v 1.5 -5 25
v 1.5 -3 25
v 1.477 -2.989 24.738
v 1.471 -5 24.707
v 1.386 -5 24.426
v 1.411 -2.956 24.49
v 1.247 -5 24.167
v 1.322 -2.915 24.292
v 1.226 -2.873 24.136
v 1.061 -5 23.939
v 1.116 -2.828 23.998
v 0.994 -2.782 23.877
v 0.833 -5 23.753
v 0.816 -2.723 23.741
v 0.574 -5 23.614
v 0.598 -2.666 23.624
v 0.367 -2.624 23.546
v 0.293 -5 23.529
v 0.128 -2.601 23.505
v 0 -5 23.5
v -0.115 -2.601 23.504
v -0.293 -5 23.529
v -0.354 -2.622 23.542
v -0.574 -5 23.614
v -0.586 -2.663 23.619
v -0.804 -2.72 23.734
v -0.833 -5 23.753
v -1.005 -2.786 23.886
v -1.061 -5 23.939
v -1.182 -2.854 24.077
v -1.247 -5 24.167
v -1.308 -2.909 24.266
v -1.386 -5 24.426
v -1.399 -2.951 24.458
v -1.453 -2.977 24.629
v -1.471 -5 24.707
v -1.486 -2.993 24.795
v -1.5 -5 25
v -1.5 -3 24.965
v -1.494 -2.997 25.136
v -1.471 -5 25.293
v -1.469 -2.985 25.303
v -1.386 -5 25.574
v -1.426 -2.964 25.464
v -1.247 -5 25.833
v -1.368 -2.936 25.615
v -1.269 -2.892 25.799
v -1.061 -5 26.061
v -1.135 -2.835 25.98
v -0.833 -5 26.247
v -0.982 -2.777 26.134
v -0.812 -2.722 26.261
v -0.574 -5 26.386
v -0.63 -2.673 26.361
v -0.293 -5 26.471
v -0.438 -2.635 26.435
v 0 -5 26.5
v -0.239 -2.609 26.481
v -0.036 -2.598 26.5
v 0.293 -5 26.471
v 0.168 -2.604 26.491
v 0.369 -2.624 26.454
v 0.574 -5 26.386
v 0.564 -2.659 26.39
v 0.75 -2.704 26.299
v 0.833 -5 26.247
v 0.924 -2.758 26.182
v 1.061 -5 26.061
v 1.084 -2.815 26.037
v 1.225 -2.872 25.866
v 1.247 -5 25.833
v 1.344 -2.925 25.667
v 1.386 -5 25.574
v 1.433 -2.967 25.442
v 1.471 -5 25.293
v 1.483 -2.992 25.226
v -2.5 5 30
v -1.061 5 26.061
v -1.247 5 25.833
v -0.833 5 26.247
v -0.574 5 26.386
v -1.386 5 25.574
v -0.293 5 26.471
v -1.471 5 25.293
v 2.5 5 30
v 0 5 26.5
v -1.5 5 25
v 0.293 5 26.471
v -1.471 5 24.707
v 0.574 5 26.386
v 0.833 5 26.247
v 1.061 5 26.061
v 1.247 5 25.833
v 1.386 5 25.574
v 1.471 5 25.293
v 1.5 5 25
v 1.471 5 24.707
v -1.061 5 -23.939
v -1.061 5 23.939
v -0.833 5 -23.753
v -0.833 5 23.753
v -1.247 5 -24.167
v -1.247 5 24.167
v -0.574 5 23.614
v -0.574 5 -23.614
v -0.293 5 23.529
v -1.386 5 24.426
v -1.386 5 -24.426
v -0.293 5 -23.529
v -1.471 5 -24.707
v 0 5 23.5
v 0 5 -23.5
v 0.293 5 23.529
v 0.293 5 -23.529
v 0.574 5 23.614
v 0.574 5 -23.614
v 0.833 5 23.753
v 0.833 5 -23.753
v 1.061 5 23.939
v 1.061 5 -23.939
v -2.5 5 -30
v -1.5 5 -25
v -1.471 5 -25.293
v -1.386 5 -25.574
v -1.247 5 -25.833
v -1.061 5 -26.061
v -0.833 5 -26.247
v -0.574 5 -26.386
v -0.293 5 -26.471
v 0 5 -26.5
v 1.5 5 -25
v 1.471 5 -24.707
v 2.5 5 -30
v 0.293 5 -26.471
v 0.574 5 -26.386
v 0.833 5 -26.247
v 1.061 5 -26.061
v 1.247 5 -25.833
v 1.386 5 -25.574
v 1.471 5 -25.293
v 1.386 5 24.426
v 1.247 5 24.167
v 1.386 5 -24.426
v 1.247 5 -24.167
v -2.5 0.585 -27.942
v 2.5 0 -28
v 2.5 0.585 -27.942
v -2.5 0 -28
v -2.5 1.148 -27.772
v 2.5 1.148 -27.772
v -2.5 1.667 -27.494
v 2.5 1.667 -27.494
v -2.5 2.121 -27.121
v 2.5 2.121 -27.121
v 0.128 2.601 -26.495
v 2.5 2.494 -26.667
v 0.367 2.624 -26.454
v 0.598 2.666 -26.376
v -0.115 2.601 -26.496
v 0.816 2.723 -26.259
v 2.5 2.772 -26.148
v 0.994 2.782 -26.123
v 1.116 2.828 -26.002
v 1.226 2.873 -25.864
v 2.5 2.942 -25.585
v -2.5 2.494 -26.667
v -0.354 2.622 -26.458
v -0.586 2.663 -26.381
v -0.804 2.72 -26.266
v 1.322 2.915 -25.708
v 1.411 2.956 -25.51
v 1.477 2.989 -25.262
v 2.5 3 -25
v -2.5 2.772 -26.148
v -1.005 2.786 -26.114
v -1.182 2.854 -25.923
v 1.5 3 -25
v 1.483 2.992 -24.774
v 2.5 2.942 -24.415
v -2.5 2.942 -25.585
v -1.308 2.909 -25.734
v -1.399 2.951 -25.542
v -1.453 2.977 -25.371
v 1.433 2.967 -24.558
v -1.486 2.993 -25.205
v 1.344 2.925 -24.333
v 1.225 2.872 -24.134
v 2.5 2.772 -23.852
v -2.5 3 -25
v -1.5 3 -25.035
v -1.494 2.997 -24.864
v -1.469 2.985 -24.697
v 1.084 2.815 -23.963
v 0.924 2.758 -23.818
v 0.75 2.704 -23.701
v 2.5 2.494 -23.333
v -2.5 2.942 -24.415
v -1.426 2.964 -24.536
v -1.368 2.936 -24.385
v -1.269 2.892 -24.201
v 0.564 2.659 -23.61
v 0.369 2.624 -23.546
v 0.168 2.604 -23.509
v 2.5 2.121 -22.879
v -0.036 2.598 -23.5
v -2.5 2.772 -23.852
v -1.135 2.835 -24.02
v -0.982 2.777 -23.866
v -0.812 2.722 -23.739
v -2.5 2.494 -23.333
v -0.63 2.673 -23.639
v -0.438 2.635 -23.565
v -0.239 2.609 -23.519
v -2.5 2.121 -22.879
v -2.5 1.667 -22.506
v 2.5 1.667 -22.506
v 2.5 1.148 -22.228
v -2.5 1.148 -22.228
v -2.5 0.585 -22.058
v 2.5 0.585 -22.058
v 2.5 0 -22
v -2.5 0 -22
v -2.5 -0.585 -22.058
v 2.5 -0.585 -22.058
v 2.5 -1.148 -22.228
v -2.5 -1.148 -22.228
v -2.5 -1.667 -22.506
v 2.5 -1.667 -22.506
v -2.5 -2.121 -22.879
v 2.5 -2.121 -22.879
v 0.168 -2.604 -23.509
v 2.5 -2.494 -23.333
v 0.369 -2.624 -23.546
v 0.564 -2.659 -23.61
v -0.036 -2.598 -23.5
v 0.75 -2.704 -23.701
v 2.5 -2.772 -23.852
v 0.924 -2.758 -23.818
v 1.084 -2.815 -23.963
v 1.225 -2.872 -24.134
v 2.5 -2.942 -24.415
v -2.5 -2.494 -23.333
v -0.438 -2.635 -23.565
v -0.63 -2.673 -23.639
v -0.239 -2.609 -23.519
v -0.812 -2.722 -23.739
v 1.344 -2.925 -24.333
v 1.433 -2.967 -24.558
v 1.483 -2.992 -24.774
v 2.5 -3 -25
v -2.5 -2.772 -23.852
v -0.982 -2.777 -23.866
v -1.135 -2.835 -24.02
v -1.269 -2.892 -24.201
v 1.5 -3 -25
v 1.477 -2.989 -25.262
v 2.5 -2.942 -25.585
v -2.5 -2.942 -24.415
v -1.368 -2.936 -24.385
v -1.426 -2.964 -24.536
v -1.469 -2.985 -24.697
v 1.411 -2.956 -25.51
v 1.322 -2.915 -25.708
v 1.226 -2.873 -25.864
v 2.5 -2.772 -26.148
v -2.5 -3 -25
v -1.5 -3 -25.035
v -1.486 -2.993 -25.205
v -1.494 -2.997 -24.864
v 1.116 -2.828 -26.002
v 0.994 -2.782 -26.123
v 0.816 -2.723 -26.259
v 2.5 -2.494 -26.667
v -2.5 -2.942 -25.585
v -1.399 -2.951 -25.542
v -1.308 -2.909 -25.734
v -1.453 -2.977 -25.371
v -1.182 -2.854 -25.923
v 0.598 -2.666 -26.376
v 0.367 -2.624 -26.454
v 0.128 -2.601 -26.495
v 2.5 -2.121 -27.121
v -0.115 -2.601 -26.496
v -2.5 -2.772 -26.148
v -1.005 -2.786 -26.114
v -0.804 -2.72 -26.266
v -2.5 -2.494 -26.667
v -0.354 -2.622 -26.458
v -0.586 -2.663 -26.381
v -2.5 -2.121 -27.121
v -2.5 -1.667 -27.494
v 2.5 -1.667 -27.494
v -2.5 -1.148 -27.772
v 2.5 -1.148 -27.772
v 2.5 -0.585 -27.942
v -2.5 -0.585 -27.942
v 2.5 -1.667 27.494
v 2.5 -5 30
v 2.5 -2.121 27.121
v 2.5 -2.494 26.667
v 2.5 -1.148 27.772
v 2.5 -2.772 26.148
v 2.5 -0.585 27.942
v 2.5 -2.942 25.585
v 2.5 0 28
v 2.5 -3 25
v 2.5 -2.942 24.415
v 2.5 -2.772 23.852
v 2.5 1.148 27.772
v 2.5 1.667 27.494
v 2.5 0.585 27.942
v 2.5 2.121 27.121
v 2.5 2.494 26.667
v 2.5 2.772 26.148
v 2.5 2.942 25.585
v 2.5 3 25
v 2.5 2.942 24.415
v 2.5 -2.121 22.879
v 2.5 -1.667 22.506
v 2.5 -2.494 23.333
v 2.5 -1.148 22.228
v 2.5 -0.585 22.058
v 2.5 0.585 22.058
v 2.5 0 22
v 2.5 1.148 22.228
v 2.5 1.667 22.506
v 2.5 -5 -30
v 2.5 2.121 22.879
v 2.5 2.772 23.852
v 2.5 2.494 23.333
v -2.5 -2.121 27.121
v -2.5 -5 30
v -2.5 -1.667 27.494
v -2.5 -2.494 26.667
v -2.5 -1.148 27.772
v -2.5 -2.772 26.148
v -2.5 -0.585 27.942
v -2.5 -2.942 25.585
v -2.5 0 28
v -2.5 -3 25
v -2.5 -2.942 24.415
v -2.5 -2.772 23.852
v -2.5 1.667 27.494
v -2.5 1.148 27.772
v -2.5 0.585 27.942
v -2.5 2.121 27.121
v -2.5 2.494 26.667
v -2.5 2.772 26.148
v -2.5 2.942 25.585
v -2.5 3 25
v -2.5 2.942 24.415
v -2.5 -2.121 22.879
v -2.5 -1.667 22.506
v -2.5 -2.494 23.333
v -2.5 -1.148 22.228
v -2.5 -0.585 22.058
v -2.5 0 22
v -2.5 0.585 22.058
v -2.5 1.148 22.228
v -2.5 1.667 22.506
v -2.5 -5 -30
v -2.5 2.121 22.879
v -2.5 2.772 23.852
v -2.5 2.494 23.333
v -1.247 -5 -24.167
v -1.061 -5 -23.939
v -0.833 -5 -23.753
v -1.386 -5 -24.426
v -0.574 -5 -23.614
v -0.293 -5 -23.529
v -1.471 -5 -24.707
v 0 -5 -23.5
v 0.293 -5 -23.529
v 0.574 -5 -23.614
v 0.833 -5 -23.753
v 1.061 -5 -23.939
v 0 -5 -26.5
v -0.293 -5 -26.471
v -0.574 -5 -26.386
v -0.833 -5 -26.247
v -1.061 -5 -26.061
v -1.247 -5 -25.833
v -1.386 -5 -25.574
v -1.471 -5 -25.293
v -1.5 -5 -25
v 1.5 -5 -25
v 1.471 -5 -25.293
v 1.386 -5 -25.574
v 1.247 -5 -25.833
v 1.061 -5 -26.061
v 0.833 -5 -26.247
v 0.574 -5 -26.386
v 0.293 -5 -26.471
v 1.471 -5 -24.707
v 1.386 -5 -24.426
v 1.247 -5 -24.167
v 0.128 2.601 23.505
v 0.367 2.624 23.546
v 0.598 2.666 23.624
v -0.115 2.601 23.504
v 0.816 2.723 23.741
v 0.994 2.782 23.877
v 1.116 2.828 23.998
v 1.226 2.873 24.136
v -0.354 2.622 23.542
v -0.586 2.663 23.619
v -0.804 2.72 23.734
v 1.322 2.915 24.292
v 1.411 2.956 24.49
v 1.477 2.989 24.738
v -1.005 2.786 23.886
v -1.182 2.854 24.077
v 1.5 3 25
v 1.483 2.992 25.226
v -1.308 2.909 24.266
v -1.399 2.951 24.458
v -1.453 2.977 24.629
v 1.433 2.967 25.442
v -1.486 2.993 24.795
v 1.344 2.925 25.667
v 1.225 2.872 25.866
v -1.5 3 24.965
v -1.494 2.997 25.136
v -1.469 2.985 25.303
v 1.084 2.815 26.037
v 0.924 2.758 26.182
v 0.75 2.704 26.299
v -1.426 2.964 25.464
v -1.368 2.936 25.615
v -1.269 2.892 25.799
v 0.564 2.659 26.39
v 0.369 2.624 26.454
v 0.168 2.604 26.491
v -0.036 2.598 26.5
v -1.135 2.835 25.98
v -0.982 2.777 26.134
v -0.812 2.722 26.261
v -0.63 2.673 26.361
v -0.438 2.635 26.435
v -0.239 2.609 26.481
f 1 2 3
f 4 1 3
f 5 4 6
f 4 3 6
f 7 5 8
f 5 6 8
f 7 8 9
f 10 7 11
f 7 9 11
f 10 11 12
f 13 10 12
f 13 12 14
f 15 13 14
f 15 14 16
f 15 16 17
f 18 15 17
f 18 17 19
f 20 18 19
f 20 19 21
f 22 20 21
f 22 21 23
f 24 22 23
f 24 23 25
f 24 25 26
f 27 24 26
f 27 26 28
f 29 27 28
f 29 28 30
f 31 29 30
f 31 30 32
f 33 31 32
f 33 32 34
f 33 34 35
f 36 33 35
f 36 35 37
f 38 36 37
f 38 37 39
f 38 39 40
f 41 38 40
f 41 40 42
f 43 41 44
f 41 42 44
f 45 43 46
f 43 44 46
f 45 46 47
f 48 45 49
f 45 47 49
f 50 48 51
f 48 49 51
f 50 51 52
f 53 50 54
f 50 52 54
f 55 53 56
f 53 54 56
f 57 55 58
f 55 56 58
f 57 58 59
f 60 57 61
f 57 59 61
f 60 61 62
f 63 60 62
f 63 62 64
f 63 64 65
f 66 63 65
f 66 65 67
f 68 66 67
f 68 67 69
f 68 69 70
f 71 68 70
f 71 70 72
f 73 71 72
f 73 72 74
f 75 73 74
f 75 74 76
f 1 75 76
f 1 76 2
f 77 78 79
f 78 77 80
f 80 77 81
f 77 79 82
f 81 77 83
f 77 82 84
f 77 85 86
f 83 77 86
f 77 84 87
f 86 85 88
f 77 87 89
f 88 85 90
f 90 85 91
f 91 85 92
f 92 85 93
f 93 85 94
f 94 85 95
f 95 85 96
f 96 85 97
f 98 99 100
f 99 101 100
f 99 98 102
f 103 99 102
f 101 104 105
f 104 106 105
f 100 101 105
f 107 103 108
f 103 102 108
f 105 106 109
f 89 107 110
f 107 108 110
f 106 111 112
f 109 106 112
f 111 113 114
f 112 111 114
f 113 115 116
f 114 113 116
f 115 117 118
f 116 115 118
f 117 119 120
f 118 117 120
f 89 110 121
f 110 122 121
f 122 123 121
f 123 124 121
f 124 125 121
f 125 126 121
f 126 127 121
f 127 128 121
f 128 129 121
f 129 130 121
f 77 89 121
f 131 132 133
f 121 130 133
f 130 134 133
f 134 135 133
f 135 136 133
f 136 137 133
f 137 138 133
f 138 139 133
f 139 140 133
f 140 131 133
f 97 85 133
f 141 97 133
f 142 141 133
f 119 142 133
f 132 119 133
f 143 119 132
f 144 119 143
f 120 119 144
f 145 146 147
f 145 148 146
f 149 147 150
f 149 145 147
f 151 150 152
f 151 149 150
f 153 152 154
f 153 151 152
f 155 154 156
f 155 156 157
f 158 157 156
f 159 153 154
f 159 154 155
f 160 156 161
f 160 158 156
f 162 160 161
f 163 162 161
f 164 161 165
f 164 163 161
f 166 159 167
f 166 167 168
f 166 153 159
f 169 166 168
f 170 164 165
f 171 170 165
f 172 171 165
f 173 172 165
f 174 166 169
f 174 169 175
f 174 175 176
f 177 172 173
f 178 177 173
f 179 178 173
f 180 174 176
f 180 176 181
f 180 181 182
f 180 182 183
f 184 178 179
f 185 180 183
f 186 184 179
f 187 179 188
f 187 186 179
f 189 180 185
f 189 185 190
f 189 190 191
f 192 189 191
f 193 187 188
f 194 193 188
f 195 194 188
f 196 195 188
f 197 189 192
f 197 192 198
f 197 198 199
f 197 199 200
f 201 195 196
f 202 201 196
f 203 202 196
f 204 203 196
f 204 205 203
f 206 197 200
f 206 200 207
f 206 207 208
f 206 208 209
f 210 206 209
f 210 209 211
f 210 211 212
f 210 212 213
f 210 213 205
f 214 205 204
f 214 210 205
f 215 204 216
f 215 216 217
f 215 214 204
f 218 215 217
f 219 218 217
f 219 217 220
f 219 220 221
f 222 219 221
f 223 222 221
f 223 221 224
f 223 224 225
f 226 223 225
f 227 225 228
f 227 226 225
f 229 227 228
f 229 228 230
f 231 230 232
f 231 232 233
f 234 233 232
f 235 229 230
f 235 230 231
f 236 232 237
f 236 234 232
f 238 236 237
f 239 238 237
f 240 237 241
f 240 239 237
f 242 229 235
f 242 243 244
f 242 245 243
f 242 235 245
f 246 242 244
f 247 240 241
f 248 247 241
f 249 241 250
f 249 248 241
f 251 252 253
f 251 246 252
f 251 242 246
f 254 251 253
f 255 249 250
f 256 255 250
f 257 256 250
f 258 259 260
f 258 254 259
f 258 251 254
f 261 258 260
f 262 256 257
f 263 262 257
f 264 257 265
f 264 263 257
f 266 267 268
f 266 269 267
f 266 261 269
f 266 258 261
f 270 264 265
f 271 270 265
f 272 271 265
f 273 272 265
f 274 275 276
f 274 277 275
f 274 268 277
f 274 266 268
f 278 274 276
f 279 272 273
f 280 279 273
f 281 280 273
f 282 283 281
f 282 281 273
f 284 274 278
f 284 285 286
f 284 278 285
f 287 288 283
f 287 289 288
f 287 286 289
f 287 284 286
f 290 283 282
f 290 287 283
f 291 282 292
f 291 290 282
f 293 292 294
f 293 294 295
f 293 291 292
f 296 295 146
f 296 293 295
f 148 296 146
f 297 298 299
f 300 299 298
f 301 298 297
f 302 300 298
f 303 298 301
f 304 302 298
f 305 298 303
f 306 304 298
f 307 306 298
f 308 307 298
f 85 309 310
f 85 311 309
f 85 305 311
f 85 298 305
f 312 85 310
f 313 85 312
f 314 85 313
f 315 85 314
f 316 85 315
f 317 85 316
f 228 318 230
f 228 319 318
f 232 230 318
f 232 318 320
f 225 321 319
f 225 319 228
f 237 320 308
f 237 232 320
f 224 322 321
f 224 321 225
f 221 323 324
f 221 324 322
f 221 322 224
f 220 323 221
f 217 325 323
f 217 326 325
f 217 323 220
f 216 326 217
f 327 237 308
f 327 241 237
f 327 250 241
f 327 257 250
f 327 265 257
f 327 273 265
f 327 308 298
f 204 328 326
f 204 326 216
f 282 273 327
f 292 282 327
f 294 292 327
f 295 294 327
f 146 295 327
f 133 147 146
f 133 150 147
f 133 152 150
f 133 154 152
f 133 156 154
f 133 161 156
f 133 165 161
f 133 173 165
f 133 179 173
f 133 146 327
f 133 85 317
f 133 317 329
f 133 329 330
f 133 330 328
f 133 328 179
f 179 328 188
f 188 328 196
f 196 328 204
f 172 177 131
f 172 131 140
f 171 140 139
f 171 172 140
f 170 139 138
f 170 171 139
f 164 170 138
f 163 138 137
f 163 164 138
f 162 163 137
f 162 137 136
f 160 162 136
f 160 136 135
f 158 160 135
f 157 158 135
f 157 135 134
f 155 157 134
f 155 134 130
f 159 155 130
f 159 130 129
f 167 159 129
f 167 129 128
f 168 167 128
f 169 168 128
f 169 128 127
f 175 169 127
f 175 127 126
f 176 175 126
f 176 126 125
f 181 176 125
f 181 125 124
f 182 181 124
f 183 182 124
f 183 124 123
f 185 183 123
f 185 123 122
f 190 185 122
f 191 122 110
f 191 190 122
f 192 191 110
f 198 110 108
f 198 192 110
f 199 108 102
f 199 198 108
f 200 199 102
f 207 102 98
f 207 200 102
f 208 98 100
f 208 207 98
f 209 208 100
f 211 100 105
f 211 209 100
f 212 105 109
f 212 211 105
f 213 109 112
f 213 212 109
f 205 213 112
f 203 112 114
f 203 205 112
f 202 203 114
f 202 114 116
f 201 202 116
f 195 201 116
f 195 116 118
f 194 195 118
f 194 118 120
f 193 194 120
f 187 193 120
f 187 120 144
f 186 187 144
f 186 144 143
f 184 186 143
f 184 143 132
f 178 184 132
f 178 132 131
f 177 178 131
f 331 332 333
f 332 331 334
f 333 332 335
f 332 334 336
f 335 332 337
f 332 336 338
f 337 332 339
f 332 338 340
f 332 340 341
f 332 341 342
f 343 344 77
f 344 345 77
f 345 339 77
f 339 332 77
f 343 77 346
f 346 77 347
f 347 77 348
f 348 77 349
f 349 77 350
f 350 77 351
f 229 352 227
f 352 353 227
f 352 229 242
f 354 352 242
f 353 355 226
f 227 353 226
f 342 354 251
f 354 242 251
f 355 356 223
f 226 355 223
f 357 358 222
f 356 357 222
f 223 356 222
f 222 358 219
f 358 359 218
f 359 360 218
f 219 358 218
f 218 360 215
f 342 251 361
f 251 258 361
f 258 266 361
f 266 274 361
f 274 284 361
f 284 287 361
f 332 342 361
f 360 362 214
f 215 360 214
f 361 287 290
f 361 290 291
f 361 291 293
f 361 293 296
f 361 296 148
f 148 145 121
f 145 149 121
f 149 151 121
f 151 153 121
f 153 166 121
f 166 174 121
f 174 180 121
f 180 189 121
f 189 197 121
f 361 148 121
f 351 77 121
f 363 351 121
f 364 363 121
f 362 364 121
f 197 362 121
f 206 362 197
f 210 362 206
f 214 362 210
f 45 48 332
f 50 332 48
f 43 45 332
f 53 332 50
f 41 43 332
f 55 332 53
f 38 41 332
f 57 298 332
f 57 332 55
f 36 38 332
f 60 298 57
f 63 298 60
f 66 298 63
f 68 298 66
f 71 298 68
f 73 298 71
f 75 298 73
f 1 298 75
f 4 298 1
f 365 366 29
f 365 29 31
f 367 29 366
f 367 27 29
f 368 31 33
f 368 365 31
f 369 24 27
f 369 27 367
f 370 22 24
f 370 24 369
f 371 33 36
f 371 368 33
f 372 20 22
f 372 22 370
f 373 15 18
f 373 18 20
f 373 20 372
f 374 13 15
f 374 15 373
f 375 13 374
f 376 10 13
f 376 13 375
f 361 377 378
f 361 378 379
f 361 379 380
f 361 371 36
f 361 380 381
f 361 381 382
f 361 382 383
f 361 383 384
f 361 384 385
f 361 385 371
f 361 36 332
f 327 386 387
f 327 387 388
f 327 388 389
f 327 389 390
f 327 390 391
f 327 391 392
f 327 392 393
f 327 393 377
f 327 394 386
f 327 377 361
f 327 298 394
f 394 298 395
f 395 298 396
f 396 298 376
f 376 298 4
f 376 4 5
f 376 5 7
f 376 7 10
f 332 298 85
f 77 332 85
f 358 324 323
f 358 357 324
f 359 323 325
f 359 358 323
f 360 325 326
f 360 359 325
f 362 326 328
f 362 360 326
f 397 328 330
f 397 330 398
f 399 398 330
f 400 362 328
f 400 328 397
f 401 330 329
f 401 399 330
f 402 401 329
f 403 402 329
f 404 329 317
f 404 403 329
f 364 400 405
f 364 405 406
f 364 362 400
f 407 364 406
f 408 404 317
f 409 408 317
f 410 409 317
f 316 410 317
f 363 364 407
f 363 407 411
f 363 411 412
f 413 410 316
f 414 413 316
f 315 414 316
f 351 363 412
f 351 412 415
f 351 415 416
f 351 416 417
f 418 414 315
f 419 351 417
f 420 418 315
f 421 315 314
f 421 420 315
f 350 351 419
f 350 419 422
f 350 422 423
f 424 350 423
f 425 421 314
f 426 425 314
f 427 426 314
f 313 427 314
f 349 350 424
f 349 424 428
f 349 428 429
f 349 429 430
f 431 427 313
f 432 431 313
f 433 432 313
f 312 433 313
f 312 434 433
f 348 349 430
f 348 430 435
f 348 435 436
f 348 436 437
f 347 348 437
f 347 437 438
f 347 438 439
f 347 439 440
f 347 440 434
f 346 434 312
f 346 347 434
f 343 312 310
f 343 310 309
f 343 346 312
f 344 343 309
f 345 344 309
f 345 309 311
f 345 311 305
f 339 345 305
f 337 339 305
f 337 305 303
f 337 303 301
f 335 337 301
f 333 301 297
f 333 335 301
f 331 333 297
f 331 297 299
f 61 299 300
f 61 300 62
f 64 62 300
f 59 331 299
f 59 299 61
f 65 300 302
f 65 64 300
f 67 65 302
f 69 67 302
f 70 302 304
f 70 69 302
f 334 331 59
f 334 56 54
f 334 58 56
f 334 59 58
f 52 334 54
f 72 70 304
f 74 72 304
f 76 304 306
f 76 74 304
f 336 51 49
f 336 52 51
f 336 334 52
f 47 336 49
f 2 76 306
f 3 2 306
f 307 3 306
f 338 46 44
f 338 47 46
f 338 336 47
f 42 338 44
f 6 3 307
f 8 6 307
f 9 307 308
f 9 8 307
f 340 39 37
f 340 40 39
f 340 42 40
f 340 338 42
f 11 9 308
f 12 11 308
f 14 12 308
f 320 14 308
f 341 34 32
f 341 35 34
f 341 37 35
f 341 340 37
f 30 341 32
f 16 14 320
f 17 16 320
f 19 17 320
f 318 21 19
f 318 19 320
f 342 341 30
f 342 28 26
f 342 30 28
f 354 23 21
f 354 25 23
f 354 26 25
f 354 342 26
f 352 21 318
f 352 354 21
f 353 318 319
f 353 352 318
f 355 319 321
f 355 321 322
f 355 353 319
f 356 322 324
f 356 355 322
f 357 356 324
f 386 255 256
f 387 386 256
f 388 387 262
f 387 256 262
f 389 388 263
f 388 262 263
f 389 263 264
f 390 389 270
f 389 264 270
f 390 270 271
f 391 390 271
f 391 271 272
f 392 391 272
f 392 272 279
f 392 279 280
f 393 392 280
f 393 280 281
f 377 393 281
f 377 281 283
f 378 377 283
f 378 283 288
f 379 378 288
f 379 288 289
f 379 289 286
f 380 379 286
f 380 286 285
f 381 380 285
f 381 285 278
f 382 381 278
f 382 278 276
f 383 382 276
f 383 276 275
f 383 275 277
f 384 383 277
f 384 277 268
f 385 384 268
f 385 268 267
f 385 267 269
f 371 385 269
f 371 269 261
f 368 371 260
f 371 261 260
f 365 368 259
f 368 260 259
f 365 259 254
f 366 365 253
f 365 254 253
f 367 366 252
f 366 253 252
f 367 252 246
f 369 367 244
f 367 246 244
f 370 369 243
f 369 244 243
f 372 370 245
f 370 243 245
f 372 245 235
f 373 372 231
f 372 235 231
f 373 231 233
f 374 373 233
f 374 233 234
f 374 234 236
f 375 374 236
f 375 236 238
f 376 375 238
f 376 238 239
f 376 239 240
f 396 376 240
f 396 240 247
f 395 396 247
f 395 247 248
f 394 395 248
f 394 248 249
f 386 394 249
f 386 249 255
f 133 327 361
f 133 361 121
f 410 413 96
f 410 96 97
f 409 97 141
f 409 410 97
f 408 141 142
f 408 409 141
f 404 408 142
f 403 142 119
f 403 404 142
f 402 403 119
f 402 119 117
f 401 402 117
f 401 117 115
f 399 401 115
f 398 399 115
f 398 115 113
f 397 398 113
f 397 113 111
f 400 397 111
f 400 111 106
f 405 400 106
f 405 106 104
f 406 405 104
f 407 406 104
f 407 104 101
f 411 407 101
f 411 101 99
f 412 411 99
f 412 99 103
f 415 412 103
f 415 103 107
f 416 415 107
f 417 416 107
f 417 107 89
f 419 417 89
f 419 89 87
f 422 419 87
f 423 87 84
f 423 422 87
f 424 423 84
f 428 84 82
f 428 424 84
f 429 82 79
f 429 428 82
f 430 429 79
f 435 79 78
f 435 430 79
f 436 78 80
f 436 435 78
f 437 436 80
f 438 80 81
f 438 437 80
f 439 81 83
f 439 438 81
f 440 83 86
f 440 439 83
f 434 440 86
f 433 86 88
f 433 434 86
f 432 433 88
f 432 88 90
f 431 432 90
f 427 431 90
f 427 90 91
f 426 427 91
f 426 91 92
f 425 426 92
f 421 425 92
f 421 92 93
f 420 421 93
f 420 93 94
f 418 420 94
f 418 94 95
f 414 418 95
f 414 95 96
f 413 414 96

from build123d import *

# Parameters (mm, degrees)
SKETCH_1_W               = 60
SKETCH_1_H               = 10
SKETCH_1_R               = 3
EXTRUDE_1_DEPTH          = 2.5
SKETCH_3_R               = 1.5
CUT_EXTRUDE_1_DEPTH      = 6
CUT_EXTRUDE_1_DEPTH_BACK = 6


with BuildPart() as part:
    # 草圖1 → 填料-伸長1 (new body, symmetric)
    with BuildSketch(Plane(origin=(0, 0, 0), x_dir=(0, 0, -1), z_dir=(1, 0, 0))):
        Rectangle(SKETCH_1_W, SKETCH_1_H)
        with Locations((-25, 0)):
            Circle(SKETCH_1_R, mode=Mode.SUBTRACT)
        with Locations((25, 0)):
            Circle(SKETCH_1_R, mode=Mode.SUBTRACT)
    extrude(amount=EXTRUDE_1_DEPTH, both=True)

    # 草圖3 → 除料-伸長1 (cut, two sides)
    with BuildSketch(Plane(origin=(0, 0, 0), x_dir=(1, 0, 0), z_dir=(0, 1, 0))) as cut_extrude_1_sk:
        with Locations((0, 25)):
            Circle(SKETCH_3_R)
        with Locations((0, -25)):
            Circle(SKETCH_3_R)
    extrude(amount=CUT_EXTRUDE_1_DEPTH, mode=Mode.SUBTRACT)
    extrude(cut_extrude_1_sk.sketch, amount=-CUT_EXTRUDE_1_DEPTH_BACK, mode=Mode.SUBTRACT)


solid = part.part
